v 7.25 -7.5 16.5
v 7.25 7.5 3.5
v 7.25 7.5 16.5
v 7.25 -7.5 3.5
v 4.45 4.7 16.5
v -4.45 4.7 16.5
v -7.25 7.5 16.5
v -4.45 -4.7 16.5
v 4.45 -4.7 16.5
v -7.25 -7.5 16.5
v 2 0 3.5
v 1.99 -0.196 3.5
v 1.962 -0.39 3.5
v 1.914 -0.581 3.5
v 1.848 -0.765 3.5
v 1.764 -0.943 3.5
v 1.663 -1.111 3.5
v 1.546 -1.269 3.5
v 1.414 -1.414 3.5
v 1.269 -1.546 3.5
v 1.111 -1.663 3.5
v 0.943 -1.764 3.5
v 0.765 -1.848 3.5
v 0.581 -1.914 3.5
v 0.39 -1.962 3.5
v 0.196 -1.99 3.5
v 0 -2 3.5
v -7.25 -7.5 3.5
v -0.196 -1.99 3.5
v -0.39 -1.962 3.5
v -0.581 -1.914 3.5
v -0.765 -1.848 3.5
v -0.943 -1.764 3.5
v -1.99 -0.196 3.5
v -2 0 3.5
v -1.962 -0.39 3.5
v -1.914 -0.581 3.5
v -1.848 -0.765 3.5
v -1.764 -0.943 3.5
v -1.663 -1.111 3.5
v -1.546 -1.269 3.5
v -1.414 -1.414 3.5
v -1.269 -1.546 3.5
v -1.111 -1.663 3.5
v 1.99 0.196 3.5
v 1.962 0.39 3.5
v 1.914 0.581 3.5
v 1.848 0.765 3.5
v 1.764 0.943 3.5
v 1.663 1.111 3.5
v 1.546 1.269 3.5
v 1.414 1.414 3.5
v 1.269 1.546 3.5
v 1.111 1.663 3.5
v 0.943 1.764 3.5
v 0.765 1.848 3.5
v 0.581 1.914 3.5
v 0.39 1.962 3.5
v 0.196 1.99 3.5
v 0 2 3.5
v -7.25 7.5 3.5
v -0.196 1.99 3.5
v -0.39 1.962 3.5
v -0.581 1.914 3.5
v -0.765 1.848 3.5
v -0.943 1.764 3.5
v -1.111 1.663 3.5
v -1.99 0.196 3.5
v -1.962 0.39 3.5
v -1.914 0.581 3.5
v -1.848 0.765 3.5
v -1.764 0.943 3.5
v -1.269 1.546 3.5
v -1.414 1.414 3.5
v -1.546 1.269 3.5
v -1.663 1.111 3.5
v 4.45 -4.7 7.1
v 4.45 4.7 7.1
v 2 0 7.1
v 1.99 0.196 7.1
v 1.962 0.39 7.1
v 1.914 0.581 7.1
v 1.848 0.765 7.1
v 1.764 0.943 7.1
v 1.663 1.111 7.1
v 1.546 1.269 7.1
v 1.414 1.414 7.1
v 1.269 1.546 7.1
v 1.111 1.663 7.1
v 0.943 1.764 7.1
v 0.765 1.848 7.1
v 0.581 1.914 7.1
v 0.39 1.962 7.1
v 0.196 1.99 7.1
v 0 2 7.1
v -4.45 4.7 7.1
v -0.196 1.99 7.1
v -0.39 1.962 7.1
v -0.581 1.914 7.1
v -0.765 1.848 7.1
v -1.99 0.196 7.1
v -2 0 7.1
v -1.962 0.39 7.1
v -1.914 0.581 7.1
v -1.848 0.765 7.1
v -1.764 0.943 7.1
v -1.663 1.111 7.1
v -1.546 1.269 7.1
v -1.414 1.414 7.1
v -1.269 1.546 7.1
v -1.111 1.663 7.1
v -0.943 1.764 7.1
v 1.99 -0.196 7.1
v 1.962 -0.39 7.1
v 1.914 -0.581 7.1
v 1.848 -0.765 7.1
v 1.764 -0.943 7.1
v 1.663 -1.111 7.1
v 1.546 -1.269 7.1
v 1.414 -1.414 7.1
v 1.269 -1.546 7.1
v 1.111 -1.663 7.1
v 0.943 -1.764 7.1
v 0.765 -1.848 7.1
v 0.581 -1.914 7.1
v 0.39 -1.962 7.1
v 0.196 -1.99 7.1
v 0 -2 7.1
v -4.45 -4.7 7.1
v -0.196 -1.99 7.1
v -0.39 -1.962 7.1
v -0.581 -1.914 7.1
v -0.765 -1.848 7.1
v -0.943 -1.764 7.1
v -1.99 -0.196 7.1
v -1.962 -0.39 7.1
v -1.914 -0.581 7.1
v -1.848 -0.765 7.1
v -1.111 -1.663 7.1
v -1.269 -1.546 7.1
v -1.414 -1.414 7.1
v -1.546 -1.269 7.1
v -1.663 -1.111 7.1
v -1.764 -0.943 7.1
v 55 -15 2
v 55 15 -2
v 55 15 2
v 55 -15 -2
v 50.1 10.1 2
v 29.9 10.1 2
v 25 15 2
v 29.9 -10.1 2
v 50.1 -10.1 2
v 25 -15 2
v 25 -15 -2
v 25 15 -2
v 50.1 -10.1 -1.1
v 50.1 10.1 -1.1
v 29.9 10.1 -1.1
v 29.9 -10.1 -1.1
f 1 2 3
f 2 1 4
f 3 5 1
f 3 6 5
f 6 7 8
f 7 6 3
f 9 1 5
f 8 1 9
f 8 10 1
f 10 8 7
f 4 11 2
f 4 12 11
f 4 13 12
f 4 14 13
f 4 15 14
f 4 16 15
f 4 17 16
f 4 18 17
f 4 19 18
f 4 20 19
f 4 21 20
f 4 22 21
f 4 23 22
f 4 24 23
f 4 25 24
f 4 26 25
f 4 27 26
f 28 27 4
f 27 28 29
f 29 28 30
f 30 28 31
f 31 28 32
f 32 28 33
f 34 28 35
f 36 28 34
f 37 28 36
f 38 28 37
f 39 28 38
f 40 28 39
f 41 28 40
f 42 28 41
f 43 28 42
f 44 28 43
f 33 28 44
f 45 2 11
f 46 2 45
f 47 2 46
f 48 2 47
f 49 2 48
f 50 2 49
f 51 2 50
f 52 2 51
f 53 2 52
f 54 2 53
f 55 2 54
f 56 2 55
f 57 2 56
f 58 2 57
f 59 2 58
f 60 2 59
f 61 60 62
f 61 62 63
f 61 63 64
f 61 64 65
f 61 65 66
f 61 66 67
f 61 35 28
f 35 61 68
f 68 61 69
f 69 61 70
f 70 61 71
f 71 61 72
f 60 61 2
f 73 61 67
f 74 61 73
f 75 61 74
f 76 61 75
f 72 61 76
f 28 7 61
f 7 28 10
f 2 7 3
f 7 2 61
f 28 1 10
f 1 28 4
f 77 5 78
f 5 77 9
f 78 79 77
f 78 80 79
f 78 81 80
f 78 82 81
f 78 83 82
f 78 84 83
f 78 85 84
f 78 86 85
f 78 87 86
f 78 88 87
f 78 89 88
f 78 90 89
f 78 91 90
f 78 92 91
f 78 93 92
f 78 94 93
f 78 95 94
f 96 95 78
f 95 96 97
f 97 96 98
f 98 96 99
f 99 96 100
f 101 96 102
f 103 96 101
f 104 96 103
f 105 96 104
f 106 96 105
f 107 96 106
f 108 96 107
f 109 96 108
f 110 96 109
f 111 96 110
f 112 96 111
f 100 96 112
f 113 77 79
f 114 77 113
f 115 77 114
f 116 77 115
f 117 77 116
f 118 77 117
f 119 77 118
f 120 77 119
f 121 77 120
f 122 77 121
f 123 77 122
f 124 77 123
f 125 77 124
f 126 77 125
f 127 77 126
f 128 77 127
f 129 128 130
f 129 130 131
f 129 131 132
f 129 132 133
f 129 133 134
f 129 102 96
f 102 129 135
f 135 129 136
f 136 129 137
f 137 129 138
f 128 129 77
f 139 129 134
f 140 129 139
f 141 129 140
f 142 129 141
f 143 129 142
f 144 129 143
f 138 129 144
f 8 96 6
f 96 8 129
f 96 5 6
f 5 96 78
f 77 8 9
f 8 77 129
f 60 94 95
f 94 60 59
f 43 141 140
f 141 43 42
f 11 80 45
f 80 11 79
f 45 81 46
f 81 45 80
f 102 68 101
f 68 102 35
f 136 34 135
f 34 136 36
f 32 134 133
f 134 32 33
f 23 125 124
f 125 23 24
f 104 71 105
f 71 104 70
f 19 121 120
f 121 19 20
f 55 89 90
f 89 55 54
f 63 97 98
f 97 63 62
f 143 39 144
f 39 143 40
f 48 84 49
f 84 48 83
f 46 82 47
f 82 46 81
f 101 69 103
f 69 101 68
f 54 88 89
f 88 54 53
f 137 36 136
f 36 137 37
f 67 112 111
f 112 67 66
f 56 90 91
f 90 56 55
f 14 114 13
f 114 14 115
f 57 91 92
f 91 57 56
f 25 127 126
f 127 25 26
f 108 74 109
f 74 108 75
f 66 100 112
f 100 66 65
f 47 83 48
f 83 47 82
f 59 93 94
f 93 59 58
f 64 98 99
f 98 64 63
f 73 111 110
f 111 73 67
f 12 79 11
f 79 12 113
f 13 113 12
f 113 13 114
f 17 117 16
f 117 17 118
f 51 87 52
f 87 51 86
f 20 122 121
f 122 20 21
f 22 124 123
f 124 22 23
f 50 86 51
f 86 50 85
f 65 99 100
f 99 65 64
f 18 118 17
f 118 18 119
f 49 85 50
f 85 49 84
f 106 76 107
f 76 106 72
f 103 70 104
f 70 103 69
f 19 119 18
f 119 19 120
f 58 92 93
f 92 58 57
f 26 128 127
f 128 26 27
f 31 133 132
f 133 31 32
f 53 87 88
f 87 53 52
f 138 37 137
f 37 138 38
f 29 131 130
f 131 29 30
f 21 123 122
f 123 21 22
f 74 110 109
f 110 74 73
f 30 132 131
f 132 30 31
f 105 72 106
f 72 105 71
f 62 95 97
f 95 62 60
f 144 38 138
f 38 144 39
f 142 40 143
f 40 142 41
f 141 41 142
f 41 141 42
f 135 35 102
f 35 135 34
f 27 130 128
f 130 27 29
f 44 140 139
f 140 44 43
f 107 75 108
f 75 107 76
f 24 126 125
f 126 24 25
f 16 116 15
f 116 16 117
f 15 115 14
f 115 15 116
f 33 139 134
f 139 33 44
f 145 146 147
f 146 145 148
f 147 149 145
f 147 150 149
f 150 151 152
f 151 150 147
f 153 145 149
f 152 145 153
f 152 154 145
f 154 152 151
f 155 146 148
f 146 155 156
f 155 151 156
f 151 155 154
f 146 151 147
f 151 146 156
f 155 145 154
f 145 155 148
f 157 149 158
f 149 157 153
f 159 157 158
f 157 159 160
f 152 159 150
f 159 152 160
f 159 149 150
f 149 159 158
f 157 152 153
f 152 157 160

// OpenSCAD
// DittoBot / Voxel Box Bot
// Phase 0 Exact Force Fixture — OpenSCAD
// Independent Fab Package addition  |  2026-11-05
// Updated 2026-11-21: SUPERSEDED by the 30 mm dual-cam face.
// Design owned by Craig. Started Nov/Dec 2025. Programmable matter.
//
// SUPERSESSION NOTICE
// -----------------
// This fixture was built for the retired 20 mm 4×EPM Alnico/NdFeB hybrid face
// (pole face Ø5.0 mm, EPM OD 8.5 mm). The current Phase 0 baseline is the
// 30 mm dual-cam staggered face: NdFeB N52 Ø6×6 mm magnet, 40-turn 34 AWG
// coil, dual 8 mm cams, 2-pin latch + retraction actuator, 5 N seating spring.
// See cad/voxel_cell_phase0_30mm_dualcam.scad and docs/PHASE0.md.
//
// This file is retained as historical reference only. Do not build from it.
// The 20×20×3 mm steel coupon recess below matches the old 20 mm face and
// is not valid for the 30 mm dual-cam article.
//
// Purpose (historical): clamp one finished EPM with pole faces parallel and exposed
// so any makerspace can pull ≥ 3.0 N ON / < 0.3 N OFF in ten minutes.
// Print in PLA/PETG or machine from plastic/aluminum. Non-magnetic preferred.
//
// Units: millimeters
// Export: F6 render → STL for the clamp body and the steel-target holder.

$fn = 64;

// ---- EPM envelope (finished coil) [RETIRED GEOMETRY] ----
epm_od          =  8.5;     // max allowed coil OD (retired)
epm_length      =  9.0;     // pole height (retired)
pole_face_d     =  5.0;     // retired pole face diameter

// ---- Clamp body ----
clamp_wall      =  3.0;
clamp_base_z    =  4.0;
clamp_opening   =  epm_od + 0.4;   // slight clearance
pull_hook_d     =  4.0;            // for luggage-scale hook or string

module clamp_body() {
    difference() {
        // outer block
        cube([epm_od + 2*clamp_wall, epm_length + 2*clamp_wall, epm_length + clamp_base_z], center=true);
        // EPM pocket (open toward working face, +Z)
        translate([0, 0, clamp_base_z/2 + 0.1])
            cube([clamp_opening, epm_length + 0.4, epm_length + 1], center=true);
        // pull-hook hole through the base (for axial pull)
        translate([0, 0, -epm_length/2 - clamp_base_z/2 + 1])
            cylinder(h=clamp_base_z + 2, d=pull_hook_d, center=true);
    }
}

// ---- Mild-steel target (reference only — cut real steel separately) ----
// This module is for a 3D-printed alignment jig; the actual target is steel.
// NOTE: 20×20×3 mm coupon recess matches the RETIRED 20 mm face.
module steel_target_jig() {
    difference() {
        cube([30, 30, 4], center=true);
        // recess that seats a 20×20×3 mm mild-steel coupon flush
        translate([0, 0, 0.5])
            cube([20.2, 20.2, 3.2], center=true);
    }
}

// Render both
translate([0, 0, 10]) clamp_body();
translate([40, 0, 0]) steel_target_jig();
